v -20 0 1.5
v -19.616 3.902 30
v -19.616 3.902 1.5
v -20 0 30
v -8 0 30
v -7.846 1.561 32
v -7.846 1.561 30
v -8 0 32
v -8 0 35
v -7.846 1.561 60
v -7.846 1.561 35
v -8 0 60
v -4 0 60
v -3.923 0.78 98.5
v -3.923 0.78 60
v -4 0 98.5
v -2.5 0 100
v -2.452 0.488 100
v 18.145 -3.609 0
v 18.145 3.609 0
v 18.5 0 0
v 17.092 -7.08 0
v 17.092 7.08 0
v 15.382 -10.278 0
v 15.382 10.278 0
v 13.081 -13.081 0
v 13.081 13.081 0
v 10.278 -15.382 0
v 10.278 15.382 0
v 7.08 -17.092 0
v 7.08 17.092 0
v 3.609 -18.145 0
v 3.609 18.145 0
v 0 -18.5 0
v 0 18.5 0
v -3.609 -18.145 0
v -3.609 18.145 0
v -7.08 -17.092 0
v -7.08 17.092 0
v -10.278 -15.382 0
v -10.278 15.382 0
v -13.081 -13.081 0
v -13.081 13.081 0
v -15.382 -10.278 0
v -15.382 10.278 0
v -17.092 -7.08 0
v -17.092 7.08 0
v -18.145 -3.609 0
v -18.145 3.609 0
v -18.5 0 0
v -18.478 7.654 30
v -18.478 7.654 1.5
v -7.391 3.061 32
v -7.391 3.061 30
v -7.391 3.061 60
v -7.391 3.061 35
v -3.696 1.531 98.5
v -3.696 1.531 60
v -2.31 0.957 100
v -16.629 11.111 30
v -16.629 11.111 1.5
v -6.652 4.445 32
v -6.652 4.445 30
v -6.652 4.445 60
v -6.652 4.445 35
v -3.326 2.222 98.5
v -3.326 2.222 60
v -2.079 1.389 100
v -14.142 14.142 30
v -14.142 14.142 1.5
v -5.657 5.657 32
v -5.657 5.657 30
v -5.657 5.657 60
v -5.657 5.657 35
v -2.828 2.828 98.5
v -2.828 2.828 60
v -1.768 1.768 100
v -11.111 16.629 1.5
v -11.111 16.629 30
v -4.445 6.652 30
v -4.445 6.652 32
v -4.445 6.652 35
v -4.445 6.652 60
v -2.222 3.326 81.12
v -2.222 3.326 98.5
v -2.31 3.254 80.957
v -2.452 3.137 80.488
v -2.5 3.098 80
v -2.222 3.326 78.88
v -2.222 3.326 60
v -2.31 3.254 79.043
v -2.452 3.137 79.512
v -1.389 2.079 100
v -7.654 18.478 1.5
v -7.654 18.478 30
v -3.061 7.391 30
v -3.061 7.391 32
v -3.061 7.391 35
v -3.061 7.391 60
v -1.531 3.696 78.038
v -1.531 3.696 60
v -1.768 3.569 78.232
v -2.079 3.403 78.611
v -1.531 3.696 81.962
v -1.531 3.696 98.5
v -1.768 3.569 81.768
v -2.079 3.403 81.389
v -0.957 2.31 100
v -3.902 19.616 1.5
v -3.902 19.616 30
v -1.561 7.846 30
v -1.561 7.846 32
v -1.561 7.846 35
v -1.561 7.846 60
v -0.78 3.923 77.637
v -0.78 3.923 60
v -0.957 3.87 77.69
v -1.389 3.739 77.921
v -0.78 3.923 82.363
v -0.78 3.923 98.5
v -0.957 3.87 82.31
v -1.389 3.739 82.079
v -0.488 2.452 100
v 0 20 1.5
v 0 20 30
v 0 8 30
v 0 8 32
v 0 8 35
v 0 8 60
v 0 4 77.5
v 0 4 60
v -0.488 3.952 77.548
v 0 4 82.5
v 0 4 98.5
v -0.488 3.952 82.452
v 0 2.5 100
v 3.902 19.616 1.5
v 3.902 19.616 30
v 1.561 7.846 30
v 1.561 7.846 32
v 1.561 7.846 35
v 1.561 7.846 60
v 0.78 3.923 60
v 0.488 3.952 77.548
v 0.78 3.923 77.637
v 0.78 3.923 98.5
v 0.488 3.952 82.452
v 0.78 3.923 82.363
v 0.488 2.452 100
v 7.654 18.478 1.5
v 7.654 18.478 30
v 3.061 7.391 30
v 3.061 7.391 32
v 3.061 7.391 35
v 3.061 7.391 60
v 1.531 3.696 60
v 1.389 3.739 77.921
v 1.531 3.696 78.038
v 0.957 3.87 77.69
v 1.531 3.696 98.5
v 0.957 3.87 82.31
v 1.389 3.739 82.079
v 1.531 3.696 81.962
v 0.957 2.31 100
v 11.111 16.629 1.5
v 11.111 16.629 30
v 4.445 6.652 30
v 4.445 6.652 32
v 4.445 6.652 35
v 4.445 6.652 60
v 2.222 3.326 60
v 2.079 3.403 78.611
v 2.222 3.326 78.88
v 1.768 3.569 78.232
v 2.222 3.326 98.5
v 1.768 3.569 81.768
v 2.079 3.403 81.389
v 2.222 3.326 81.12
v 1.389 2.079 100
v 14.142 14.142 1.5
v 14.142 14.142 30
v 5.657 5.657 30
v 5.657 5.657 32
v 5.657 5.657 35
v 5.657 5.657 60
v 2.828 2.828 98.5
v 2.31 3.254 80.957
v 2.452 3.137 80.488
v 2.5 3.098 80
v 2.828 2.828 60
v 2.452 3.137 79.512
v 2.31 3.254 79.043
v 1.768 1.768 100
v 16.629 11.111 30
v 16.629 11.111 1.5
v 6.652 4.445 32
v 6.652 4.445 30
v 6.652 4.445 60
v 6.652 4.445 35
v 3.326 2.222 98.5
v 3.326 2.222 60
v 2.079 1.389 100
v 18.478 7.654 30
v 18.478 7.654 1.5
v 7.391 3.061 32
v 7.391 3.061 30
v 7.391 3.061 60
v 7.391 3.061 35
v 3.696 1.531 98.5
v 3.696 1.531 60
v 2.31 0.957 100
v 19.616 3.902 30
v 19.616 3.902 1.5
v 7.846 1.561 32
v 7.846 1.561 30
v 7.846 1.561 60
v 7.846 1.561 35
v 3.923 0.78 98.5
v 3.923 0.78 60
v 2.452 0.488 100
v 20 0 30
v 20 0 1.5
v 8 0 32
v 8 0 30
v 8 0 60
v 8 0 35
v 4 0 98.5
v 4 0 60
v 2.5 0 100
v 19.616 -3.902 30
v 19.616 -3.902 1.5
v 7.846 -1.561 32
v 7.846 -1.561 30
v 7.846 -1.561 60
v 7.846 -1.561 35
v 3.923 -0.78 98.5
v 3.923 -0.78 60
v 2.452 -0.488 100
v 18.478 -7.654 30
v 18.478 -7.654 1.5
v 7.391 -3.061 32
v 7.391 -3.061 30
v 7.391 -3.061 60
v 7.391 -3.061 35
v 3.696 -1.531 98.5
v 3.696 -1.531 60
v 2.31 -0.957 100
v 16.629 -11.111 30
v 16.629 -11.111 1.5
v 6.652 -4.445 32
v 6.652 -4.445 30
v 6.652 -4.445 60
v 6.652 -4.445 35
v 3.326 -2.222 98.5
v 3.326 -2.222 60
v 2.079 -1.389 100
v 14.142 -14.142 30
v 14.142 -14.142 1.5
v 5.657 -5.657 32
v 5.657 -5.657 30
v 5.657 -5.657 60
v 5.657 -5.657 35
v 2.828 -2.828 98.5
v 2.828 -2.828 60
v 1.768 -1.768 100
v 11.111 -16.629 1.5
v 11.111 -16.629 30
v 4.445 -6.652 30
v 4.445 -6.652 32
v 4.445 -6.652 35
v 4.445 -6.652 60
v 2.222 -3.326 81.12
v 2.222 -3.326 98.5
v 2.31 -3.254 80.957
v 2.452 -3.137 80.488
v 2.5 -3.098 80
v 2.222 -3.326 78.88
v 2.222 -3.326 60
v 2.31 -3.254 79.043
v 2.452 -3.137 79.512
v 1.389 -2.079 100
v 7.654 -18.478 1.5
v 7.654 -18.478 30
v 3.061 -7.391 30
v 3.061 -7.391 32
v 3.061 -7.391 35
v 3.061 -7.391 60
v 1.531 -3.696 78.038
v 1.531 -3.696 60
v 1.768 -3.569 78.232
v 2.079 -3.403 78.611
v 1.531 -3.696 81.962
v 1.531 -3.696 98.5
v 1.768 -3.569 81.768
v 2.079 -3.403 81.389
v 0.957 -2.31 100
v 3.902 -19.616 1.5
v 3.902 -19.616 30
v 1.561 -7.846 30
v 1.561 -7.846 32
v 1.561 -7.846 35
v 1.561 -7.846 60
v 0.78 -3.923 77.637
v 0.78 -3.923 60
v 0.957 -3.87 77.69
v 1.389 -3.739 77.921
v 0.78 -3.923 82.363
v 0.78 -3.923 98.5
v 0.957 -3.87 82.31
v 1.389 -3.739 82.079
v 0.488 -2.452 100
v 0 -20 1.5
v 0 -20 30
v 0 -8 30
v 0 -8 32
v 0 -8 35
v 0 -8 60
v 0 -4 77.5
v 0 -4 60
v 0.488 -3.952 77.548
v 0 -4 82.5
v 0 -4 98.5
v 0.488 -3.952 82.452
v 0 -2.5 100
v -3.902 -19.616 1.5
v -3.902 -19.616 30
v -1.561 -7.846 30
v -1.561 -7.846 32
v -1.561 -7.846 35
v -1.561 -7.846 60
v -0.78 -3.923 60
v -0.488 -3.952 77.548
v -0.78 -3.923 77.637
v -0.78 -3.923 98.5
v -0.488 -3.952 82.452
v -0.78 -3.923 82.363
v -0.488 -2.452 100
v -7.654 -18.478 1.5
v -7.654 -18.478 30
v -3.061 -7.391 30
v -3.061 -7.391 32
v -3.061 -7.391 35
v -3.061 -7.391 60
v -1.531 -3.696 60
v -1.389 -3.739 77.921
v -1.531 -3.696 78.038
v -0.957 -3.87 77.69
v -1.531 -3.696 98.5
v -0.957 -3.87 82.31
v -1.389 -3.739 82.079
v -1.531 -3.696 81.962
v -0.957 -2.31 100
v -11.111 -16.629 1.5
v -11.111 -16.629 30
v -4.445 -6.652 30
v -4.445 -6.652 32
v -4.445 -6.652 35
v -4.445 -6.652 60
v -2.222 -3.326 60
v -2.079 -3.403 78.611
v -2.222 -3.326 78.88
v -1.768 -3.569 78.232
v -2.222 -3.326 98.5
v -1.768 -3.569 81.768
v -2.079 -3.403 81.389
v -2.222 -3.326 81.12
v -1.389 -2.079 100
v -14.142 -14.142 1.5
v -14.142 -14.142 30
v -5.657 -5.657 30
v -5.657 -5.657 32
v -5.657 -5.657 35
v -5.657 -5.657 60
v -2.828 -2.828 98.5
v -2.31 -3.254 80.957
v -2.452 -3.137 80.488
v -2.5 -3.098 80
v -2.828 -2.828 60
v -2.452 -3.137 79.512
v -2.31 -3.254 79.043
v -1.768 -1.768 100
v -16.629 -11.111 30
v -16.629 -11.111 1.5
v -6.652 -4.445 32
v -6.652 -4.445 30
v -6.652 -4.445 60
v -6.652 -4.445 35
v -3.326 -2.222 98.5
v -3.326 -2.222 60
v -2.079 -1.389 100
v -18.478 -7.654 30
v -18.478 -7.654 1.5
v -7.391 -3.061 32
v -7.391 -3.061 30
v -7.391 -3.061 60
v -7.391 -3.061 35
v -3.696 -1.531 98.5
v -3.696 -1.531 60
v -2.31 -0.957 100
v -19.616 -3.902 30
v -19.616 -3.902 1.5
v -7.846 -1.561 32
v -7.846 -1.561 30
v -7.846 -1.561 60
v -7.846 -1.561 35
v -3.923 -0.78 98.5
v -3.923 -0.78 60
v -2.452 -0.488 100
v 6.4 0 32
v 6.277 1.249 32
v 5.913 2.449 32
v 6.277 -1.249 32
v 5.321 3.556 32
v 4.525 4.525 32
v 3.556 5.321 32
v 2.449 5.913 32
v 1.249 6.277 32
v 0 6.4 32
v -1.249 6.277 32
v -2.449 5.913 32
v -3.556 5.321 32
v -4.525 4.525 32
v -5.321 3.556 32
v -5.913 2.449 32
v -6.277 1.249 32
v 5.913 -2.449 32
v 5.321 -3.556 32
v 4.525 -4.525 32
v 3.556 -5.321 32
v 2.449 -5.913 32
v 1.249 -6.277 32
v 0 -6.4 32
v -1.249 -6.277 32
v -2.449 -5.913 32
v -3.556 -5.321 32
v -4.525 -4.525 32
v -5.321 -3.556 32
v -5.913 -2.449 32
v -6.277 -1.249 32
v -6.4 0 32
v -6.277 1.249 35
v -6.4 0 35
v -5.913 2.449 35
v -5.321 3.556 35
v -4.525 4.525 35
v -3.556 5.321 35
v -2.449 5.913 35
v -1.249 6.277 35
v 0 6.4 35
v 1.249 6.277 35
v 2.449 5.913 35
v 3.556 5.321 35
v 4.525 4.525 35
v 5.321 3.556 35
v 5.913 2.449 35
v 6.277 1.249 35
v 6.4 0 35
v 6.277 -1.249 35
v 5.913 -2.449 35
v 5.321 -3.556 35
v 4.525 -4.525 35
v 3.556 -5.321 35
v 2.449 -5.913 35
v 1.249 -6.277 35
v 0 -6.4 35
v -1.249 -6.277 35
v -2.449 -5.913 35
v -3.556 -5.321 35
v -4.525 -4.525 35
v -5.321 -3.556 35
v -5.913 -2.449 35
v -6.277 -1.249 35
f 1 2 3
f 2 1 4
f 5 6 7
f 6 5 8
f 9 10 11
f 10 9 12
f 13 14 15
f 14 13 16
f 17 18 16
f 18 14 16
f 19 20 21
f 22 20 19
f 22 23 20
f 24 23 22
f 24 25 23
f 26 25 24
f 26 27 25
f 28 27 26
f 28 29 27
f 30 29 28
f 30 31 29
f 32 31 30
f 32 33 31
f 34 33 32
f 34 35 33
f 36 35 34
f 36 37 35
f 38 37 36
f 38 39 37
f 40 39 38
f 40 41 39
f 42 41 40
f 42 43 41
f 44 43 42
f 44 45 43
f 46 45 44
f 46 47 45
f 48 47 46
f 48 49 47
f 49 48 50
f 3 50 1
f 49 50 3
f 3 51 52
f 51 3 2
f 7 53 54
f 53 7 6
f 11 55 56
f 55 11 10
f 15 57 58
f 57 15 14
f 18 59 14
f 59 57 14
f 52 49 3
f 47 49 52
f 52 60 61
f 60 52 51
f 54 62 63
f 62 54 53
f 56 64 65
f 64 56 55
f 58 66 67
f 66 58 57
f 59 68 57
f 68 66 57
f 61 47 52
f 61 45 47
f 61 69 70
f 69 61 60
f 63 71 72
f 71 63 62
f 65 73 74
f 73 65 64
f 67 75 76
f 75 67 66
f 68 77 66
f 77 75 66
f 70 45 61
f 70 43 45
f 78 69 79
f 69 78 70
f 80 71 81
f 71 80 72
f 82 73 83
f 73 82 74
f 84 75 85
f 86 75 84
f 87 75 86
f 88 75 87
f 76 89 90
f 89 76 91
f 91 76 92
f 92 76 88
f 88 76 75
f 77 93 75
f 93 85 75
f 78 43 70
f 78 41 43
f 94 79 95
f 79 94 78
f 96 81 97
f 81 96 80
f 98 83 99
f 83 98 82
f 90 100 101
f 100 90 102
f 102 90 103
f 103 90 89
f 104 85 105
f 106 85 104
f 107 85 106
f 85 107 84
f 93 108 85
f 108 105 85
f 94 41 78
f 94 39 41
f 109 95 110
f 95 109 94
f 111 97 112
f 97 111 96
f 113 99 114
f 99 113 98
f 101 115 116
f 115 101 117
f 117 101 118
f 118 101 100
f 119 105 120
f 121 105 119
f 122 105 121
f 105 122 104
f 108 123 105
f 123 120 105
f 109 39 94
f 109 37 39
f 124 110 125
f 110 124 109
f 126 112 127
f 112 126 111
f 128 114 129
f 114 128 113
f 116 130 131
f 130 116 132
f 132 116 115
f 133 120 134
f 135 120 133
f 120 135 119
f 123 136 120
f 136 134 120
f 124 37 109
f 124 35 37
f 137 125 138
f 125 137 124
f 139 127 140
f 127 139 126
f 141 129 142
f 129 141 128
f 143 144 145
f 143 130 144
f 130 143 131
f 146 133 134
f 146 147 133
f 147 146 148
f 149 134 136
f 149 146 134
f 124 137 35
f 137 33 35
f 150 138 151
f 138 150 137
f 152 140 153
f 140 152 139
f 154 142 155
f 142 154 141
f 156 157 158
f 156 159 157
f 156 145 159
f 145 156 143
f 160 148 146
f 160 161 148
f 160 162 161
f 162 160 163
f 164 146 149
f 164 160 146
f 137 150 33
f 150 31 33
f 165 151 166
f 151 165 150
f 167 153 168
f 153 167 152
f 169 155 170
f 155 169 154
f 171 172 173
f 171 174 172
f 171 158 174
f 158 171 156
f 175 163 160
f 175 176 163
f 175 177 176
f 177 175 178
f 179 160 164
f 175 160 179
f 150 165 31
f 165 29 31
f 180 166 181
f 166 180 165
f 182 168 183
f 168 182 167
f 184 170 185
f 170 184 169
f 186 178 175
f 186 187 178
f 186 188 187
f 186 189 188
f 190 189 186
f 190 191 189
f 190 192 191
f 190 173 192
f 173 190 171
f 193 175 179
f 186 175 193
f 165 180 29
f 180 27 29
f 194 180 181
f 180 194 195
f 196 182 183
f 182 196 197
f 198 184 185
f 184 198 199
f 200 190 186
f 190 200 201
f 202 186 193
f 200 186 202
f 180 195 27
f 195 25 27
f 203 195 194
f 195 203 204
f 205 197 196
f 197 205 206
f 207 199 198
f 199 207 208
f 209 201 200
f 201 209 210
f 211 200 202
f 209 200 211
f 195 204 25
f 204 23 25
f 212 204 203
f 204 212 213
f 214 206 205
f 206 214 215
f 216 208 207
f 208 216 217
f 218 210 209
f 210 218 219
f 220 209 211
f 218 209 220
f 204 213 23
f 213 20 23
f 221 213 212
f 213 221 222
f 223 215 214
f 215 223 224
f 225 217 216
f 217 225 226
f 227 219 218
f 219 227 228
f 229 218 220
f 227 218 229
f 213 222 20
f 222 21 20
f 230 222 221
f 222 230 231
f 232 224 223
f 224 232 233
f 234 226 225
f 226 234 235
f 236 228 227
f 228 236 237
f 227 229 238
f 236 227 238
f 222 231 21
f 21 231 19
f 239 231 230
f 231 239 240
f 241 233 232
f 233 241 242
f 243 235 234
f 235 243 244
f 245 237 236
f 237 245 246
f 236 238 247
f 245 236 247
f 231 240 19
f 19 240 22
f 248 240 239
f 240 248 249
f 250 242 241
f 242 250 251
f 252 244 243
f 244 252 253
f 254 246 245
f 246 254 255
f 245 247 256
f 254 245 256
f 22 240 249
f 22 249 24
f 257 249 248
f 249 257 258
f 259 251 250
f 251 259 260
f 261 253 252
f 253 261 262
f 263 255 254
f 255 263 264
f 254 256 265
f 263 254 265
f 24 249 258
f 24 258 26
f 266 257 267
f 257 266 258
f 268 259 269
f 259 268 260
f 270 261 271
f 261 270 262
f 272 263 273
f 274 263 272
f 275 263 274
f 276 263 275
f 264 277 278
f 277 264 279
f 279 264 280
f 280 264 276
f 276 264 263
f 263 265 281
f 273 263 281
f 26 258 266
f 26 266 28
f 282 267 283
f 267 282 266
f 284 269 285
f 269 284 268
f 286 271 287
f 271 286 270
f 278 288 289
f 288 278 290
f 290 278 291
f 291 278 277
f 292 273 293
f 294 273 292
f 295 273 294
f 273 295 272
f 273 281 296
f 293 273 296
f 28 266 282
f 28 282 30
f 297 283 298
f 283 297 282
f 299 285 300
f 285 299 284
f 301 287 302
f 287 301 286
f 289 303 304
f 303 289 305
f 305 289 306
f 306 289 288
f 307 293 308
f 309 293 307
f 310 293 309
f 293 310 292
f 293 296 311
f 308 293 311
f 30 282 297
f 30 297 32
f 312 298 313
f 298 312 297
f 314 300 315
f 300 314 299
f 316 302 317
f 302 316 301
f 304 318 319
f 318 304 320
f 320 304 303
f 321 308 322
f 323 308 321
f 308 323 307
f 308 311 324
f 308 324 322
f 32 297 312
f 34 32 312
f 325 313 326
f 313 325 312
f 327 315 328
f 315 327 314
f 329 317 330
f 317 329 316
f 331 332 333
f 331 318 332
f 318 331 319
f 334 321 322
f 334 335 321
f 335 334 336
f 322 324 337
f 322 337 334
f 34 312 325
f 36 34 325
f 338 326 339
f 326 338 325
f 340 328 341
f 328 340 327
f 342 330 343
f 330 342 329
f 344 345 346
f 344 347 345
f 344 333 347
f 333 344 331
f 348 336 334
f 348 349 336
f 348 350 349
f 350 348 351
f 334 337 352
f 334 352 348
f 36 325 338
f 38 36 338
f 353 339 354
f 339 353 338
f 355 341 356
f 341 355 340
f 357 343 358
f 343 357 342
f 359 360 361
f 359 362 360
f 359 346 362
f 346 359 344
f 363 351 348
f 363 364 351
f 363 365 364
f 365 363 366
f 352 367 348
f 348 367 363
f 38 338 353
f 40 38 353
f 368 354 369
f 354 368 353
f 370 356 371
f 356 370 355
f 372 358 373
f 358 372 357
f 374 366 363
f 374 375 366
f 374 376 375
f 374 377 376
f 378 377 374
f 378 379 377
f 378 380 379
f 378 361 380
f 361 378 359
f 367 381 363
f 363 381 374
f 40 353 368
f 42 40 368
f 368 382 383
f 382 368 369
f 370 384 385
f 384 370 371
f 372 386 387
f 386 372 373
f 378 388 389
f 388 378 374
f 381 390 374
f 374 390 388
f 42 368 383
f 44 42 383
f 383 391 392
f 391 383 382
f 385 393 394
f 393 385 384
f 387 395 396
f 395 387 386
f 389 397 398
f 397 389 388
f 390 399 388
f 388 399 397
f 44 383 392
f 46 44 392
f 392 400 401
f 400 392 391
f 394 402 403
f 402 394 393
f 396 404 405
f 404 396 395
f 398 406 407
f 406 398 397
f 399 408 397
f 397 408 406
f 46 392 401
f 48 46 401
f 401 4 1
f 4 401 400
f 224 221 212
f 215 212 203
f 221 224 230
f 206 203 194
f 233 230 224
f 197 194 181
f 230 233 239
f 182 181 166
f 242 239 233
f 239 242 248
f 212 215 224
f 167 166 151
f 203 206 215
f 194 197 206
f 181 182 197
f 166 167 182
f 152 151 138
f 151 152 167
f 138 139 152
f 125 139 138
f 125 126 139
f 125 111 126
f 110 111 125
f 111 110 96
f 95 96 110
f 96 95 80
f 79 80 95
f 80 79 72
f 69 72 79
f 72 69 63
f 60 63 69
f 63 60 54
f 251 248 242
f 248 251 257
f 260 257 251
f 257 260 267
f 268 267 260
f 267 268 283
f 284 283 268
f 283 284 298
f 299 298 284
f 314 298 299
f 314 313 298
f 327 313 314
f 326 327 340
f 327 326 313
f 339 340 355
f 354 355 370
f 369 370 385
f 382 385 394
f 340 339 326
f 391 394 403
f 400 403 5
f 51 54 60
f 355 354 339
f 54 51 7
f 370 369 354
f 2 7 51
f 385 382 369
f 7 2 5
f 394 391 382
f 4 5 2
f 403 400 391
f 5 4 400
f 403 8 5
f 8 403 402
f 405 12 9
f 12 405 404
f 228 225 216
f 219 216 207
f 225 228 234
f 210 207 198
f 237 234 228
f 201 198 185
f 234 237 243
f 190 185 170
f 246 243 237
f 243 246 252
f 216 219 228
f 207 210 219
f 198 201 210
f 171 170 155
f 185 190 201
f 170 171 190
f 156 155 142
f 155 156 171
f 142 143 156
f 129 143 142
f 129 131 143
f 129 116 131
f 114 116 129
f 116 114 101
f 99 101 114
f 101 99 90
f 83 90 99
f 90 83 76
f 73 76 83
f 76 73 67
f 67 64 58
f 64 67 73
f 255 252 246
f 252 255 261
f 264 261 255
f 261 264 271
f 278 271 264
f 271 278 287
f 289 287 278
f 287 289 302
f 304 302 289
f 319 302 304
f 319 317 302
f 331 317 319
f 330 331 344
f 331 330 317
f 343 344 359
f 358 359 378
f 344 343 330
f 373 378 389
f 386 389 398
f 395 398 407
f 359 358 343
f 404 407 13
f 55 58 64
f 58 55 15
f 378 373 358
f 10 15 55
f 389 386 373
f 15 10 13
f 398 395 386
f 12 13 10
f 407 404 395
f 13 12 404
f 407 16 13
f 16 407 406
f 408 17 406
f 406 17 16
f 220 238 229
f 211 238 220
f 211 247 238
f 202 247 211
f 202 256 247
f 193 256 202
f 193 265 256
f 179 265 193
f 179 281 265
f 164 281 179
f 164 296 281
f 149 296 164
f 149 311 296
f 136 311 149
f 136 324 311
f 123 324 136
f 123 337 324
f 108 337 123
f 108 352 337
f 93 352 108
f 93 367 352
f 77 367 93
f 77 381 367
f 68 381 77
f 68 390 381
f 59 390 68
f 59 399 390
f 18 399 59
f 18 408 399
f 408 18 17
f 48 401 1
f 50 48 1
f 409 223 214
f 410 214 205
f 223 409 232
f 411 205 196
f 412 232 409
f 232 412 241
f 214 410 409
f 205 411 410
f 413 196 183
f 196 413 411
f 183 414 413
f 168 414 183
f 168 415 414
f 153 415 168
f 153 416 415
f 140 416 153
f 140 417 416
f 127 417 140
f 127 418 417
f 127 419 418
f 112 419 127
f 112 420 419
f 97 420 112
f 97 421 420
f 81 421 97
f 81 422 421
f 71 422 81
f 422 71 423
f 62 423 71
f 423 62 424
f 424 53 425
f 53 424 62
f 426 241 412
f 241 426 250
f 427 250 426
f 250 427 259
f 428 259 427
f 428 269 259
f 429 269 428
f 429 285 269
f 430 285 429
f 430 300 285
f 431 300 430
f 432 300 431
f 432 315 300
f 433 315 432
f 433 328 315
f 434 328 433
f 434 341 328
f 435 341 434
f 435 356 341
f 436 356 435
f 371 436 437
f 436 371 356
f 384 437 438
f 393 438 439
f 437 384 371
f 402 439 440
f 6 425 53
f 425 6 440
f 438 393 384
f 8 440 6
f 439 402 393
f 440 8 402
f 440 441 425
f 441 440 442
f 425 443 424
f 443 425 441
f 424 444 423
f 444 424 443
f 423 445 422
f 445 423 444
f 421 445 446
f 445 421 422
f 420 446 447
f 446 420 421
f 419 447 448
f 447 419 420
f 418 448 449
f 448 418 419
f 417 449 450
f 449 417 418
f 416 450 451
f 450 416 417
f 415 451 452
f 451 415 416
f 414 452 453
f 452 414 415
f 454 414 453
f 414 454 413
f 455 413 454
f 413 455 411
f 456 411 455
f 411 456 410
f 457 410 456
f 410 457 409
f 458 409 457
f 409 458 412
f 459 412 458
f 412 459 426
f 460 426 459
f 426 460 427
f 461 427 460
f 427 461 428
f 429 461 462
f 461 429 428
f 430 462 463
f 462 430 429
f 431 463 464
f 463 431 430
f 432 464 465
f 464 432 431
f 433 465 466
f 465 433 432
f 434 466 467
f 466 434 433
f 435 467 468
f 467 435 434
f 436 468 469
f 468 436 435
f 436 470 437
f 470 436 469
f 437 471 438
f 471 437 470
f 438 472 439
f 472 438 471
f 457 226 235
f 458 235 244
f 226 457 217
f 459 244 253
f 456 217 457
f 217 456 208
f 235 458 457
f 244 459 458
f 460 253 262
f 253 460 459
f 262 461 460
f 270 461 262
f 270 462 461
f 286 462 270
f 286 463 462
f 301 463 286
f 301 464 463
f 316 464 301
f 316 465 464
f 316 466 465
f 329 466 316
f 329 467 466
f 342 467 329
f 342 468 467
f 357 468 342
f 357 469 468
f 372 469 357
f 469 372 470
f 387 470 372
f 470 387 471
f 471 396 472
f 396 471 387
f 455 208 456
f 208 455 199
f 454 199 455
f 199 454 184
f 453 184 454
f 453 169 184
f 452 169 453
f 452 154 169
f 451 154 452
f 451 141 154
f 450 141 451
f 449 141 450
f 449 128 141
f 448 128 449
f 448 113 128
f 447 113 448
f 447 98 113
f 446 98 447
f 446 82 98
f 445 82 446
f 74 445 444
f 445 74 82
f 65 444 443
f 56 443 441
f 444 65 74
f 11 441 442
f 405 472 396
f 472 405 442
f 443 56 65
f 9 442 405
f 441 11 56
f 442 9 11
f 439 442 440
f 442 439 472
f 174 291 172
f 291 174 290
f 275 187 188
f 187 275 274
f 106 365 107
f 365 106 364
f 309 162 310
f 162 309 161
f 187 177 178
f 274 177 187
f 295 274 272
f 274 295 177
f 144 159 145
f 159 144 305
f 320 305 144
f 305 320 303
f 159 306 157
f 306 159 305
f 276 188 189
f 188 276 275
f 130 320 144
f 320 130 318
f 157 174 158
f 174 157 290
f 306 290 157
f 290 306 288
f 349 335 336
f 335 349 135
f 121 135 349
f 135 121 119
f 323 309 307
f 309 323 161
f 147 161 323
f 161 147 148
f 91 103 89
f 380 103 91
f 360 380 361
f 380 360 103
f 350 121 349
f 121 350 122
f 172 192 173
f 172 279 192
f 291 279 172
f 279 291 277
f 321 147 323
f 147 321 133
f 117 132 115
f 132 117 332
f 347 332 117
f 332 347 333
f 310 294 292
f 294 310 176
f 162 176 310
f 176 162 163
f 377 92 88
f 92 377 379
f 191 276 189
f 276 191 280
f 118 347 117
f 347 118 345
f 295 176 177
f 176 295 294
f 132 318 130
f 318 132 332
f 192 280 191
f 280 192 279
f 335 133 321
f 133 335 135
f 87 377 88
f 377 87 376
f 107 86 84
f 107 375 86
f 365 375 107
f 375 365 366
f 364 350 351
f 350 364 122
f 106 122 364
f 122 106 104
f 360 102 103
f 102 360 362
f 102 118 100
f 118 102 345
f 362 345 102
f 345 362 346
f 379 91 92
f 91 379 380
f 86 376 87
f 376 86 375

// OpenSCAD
$fn = 32;

// ----------------------------------------------------------------------
// Stepped shaft: diameters 40, 16, 8 mm, 100 mm long
// ----------------------------------------------------------------------

// --- parameters (mm) ---
d1 = 40;                  // step 1 diameter
len1 = 30;                // step 1 length
d2 = 16;                  // step 2 diameter
len2 = 30;                // step 2 length
d3 = 8;                   // step 3 diameter
len3 = 40;                // step 3 length
total = 100;              // overall length
chamfer = 1.5;            // end chamfer
groove_r = 8;             // groove radius
groove_z = 32;            // groove position from the end
groove_w = 3;             // groove width
groove_d = 1.6;           // groove depth
key_w = 5;                // keyway width
key_d = 2.5;              // keyway depth
key_len = 24;             // keyway length
key_z = 73;               // keyway start along the shaft
cross_d = 5;              // cross pin hole
cross_z = 80;             // cross hole position

/* closed turning profile: x is the radius, y is the length */
profile = [[0, 0], [20 - chamfer, 0], [20, chamfer], [20, 30], [8, 30], [8, 60], [4, 60], [4, 98.5], [2.5, 100], [0, 100]];

difference() {
  rotate_extrude() polygon(profile);
  /* circlip groove just behind the shoulder */
  rotate_extrude() translate([groove_r - groove_d, groove_z]) square([groove_d + 1, groove_w]);
  /* keyway milled into the top of the largest step */
  translate([d1 / 2 - key_d, -key_w / 2, key_z]) cube([key_d + 1, key_w, key_len]);
  /* cross pin hole through the small step */
  translate([0, 0, cross_z]) rotate([90, 0, 0]) cylinder(h = d3 + 4, d = cross_d, center = true);
}
